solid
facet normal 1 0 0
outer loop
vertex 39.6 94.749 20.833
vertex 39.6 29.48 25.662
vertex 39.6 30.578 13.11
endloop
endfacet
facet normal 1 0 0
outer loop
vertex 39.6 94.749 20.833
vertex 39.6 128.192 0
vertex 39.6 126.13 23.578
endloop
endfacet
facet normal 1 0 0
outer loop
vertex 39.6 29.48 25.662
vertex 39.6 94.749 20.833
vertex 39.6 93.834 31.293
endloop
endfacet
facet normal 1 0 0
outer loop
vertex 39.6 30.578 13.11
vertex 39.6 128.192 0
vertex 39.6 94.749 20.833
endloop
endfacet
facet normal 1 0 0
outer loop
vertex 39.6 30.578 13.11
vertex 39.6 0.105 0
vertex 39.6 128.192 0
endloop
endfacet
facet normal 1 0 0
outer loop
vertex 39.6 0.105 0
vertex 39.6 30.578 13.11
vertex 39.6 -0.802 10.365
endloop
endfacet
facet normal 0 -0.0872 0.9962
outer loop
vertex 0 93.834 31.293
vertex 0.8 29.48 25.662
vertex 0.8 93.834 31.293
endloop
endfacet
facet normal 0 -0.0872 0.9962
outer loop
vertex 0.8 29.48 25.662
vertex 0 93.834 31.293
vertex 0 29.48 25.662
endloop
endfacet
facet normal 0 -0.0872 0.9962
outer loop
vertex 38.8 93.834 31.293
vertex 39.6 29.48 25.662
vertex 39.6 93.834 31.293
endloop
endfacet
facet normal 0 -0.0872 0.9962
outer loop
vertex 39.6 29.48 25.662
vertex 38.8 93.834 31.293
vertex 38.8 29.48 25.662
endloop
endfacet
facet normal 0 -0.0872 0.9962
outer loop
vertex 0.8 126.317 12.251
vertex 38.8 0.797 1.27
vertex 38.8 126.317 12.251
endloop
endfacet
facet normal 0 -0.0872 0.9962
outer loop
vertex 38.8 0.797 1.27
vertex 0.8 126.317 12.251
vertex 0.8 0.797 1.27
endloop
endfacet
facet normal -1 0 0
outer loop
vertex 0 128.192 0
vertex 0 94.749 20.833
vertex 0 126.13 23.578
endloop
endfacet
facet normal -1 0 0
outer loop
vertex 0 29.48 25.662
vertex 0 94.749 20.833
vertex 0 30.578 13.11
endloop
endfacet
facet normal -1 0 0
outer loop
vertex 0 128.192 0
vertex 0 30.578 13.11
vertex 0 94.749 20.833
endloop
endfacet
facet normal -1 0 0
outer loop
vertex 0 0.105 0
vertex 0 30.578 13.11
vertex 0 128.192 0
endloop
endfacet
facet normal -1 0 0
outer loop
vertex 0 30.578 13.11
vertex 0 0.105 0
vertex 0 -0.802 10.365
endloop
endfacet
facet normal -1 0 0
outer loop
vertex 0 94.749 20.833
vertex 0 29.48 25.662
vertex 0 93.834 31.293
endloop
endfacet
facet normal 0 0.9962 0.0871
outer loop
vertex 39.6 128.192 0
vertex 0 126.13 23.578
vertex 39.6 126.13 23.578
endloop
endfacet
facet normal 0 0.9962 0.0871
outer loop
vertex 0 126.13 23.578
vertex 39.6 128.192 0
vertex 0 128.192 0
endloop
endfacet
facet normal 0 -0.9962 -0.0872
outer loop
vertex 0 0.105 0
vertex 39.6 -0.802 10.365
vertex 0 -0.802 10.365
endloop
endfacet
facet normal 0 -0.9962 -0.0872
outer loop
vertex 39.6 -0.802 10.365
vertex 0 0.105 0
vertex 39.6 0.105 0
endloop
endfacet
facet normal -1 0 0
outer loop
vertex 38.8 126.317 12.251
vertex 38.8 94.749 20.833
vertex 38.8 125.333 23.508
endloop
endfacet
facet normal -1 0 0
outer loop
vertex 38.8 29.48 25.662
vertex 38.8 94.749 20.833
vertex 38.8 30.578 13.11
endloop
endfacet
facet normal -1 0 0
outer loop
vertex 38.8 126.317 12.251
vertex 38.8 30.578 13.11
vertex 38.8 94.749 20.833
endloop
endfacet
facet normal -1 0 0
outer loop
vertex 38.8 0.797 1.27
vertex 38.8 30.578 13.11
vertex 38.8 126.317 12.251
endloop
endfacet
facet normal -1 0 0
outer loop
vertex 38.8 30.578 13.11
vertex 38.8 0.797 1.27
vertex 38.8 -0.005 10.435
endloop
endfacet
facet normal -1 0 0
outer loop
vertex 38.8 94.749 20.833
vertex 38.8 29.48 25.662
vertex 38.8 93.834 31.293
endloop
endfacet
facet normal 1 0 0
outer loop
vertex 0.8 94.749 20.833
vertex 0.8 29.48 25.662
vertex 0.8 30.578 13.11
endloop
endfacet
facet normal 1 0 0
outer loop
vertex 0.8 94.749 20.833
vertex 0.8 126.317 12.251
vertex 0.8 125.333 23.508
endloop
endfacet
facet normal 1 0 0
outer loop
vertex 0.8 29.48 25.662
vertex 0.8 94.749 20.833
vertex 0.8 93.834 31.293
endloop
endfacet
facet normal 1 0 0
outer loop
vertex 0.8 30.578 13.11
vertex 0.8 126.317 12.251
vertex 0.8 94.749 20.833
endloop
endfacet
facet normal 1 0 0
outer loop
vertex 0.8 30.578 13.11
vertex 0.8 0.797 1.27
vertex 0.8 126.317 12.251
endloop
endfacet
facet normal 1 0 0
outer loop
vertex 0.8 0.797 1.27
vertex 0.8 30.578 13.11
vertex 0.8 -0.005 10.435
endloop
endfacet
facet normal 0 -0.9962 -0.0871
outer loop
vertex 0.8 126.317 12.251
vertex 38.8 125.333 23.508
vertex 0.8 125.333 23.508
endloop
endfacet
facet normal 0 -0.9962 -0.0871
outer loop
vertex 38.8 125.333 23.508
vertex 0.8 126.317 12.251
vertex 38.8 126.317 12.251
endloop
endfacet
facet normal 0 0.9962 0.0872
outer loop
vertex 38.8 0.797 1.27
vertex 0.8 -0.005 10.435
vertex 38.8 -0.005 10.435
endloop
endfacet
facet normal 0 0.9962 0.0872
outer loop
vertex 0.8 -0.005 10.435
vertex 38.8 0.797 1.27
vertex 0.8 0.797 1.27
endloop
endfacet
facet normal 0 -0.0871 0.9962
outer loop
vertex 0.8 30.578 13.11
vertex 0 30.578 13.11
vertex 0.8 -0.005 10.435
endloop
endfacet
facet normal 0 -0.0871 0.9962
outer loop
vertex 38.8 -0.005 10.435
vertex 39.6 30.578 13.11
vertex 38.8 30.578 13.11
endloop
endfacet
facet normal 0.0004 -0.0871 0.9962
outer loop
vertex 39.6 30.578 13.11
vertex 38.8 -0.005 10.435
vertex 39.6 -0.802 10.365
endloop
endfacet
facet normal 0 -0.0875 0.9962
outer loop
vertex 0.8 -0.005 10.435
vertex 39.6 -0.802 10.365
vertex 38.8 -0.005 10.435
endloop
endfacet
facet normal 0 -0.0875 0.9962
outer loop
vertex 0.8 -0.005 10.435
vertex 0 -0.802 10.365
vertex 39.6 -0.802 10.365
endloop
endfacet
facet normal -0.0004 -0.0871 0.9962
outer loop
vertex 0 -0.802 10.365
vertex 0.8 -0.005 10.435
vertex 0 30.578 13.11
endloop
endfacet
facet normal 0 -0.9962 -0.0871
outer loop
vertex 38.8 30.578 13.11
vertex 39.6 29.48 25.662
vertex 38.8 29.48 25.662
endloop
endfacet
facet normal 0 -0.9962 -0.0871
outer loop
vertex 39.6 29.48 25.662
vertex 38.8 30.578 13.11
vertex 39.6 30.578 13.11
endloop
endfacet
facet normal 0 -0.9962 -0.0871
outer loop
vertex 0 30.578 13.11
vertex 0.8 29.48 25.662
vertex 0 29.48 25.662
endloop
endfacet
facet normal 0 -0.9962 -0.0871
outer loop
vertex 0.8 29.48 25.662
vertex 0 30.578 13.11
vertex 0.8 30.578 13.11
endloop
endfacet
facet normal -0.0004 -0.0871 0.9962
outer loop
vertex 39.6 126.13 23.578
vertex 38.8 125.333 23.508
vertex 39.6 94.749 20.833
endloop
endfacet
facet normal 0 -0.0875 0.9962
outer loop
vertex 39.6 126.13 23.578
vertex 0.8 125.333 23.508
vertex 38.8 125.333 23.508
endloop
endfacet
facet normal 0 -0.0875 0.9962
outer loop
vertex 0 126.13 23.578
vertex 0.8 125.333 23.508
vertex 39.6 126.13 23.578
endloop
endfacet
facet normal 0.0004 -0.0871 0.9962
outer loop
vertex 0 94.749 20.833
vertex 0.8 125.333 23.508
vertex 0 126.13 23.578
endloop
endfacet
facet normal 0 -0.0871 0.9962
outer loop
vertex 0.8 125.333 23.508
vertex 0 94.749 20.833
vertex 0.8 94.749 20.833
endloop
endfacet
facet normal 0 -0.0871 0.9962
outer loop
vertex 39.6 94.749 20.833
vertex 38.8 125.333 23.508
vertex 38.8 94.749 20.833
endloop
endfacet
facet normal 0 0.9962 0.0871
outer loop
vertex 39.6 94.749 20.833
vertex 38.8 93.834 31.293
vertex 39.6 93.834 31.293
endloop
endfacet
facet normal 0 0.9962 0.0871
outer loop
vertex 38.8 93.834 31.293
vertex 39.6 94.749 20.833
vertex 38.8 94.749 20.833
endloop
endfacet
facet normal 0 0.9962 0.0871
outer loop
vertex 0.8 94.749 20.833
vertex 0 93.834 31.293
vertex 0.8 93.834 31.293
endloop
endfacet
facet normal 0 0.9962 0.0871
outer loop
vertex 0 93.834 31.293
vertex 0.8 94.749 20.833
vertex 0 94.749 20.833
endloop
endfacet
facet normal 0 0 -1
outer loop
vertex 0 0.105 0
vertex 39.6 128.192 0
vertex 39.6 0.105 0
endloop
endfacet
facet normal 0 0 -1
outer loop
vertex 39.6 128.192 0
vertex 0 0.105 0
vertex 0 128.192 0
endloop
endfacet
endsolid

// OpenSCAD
b_width = 38;
b_di = 21;
wall = .8;
lift = 5;
b_count = 6;

difference() {
    translate([0,0,1.2]) rotate([lift,0,0]) {
        difference() {
            cube([b_width+wall*2, b_di*b_count+wall*2, b_di+wall]);
            translate([wall,wall,0]) cube([b_width, b_di*b_count, b_di*wall*2]);
            translate([0,0,wall+b_di*.4]) cube([b_width+wall*2, b_di*1.5, b_di]);
            translate([0,wall*2+b_di*b_count-b_di*1.5,wall+b_di/2]) cube([b_width+wall*2, b_di*1.5, b_di]);
        }
        translate([0,0,-100]) cube([b_width+wall*2, b_di*b_count+wall*2, 100]);
    }
    translate([0,0,-300]) cube([300,300,300]);
}
